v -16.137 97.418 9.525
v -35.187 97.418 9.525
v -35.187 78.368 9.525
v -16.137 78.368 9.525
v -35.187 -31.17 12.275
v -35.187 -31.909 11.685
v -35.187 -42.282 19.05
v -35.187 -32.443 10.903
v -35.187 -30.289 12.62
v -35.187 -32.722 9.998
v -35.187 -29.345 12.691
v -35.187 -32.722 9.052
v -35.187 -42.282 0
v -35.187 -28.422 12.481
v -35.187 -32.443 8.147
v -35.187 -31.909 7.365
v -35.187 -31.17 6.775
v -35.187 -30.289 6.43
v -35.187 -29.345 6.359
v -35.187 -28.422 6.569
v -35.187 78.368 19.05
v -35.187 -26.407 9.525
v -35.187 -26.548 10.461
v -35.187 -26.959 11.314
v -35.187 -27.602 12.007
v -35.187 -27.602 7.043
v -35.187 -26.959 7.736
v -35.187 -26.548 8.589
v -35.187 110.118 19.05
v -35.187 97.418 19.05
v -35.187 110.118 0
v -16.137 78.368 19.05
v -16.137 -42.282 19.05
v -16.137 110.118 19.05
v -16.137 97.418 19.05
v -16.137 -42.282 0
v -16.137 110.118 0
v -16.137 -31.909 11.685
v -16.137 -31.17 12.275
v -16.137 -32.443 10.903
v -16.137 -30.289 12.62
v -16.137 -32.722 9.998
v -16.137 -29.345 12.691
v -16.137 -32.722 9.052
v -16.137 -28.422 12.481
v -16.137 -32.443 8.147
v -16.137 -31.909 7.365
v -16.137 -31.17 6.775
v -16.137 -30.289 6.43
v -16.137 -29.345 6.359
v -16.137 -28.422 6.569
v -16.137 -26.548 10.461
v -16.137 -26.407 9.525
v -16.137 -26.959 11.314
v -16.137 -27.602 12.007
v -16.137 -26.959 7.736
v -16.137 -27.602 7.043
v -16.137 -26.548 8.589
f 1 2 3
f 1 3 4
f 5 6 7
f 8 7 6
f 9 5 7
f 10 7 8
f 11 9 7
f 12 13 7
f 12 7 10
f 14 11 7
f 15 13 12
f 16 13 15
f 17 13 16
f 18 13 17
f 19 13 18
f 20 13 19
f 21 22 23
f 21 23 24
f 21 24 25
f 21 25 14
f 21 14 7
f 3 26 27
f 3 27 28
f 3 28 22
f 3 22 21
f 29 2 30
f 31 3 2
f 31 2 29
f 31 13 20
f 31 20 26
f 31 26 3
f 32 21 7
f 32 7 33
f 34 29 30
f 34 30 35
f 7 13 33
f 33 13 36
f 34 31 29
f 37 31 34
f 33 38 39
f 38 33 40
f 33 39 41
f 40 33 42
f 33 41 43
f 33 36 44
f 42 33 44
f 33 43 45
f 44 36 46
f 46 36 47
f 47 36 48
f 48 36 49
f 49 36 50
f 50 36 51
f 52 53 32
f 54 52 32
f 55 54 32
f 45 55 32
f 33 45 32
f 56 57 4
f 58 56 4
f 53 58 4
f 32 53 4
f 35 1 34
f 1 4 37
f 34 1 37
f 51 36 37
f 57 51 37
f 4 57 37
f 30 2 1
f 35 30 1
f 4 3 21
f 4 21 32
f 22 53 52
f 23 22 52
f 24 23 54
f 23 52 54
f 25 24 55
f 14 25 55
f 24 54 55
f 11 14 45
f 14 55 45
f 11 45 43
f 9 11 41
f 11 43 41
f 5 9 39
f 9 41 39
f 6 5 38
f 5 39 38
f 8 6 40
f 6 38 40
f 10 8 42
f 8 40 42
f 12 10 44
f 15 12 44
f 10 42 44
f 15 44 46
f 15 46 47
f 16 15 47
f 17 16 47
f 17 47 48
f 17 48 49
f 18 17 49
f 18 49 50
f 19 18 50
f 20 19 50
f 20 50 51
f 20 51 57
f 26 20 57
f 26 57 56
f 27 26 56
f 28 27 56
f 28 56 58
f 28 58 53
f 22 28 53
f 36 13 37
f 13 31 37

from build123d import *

# Parameters (mm, degrees)
F0_W     = 19.05
F0_H     = 19.05
F1_DEPTH = 9.525
F0_H_2   = 120.65
F0_H_3   = 12.7
F2_DEPTH = 19.05
F4_D     = 6.35


with BuildPart() as f1:
    # F0 (on Top) → F1 (new body)
    with BuildSketch(Plane.XY):
        with Locations((-25.66231, 87.892967)):
            Rectangle(F0_W, F0_H)
    extrude(amount=F1_DEPTH)

    # F0 (on Top) → F2 (join)
    with BuildSketch(Plane.XY):
        with Locations((-25.66231, 18.042967)):
            Rectangle(F0_W, F0_H_2)
        with Locations((-25.66231, 103.767967)):
            Rectangle(F0_W, F0_H_3)
    extrude(amount=F2_DEPTH)

    # F4 (through all)
    with Locations(Plane(origin=(-35.18731, 0, 0), x_dir=(0, -1, 0), z_dir=(-1, 0, 0))):
        with Locations((29.582033, 9.525)):
            Hole(F4_D / 2)


solid = f1.part
